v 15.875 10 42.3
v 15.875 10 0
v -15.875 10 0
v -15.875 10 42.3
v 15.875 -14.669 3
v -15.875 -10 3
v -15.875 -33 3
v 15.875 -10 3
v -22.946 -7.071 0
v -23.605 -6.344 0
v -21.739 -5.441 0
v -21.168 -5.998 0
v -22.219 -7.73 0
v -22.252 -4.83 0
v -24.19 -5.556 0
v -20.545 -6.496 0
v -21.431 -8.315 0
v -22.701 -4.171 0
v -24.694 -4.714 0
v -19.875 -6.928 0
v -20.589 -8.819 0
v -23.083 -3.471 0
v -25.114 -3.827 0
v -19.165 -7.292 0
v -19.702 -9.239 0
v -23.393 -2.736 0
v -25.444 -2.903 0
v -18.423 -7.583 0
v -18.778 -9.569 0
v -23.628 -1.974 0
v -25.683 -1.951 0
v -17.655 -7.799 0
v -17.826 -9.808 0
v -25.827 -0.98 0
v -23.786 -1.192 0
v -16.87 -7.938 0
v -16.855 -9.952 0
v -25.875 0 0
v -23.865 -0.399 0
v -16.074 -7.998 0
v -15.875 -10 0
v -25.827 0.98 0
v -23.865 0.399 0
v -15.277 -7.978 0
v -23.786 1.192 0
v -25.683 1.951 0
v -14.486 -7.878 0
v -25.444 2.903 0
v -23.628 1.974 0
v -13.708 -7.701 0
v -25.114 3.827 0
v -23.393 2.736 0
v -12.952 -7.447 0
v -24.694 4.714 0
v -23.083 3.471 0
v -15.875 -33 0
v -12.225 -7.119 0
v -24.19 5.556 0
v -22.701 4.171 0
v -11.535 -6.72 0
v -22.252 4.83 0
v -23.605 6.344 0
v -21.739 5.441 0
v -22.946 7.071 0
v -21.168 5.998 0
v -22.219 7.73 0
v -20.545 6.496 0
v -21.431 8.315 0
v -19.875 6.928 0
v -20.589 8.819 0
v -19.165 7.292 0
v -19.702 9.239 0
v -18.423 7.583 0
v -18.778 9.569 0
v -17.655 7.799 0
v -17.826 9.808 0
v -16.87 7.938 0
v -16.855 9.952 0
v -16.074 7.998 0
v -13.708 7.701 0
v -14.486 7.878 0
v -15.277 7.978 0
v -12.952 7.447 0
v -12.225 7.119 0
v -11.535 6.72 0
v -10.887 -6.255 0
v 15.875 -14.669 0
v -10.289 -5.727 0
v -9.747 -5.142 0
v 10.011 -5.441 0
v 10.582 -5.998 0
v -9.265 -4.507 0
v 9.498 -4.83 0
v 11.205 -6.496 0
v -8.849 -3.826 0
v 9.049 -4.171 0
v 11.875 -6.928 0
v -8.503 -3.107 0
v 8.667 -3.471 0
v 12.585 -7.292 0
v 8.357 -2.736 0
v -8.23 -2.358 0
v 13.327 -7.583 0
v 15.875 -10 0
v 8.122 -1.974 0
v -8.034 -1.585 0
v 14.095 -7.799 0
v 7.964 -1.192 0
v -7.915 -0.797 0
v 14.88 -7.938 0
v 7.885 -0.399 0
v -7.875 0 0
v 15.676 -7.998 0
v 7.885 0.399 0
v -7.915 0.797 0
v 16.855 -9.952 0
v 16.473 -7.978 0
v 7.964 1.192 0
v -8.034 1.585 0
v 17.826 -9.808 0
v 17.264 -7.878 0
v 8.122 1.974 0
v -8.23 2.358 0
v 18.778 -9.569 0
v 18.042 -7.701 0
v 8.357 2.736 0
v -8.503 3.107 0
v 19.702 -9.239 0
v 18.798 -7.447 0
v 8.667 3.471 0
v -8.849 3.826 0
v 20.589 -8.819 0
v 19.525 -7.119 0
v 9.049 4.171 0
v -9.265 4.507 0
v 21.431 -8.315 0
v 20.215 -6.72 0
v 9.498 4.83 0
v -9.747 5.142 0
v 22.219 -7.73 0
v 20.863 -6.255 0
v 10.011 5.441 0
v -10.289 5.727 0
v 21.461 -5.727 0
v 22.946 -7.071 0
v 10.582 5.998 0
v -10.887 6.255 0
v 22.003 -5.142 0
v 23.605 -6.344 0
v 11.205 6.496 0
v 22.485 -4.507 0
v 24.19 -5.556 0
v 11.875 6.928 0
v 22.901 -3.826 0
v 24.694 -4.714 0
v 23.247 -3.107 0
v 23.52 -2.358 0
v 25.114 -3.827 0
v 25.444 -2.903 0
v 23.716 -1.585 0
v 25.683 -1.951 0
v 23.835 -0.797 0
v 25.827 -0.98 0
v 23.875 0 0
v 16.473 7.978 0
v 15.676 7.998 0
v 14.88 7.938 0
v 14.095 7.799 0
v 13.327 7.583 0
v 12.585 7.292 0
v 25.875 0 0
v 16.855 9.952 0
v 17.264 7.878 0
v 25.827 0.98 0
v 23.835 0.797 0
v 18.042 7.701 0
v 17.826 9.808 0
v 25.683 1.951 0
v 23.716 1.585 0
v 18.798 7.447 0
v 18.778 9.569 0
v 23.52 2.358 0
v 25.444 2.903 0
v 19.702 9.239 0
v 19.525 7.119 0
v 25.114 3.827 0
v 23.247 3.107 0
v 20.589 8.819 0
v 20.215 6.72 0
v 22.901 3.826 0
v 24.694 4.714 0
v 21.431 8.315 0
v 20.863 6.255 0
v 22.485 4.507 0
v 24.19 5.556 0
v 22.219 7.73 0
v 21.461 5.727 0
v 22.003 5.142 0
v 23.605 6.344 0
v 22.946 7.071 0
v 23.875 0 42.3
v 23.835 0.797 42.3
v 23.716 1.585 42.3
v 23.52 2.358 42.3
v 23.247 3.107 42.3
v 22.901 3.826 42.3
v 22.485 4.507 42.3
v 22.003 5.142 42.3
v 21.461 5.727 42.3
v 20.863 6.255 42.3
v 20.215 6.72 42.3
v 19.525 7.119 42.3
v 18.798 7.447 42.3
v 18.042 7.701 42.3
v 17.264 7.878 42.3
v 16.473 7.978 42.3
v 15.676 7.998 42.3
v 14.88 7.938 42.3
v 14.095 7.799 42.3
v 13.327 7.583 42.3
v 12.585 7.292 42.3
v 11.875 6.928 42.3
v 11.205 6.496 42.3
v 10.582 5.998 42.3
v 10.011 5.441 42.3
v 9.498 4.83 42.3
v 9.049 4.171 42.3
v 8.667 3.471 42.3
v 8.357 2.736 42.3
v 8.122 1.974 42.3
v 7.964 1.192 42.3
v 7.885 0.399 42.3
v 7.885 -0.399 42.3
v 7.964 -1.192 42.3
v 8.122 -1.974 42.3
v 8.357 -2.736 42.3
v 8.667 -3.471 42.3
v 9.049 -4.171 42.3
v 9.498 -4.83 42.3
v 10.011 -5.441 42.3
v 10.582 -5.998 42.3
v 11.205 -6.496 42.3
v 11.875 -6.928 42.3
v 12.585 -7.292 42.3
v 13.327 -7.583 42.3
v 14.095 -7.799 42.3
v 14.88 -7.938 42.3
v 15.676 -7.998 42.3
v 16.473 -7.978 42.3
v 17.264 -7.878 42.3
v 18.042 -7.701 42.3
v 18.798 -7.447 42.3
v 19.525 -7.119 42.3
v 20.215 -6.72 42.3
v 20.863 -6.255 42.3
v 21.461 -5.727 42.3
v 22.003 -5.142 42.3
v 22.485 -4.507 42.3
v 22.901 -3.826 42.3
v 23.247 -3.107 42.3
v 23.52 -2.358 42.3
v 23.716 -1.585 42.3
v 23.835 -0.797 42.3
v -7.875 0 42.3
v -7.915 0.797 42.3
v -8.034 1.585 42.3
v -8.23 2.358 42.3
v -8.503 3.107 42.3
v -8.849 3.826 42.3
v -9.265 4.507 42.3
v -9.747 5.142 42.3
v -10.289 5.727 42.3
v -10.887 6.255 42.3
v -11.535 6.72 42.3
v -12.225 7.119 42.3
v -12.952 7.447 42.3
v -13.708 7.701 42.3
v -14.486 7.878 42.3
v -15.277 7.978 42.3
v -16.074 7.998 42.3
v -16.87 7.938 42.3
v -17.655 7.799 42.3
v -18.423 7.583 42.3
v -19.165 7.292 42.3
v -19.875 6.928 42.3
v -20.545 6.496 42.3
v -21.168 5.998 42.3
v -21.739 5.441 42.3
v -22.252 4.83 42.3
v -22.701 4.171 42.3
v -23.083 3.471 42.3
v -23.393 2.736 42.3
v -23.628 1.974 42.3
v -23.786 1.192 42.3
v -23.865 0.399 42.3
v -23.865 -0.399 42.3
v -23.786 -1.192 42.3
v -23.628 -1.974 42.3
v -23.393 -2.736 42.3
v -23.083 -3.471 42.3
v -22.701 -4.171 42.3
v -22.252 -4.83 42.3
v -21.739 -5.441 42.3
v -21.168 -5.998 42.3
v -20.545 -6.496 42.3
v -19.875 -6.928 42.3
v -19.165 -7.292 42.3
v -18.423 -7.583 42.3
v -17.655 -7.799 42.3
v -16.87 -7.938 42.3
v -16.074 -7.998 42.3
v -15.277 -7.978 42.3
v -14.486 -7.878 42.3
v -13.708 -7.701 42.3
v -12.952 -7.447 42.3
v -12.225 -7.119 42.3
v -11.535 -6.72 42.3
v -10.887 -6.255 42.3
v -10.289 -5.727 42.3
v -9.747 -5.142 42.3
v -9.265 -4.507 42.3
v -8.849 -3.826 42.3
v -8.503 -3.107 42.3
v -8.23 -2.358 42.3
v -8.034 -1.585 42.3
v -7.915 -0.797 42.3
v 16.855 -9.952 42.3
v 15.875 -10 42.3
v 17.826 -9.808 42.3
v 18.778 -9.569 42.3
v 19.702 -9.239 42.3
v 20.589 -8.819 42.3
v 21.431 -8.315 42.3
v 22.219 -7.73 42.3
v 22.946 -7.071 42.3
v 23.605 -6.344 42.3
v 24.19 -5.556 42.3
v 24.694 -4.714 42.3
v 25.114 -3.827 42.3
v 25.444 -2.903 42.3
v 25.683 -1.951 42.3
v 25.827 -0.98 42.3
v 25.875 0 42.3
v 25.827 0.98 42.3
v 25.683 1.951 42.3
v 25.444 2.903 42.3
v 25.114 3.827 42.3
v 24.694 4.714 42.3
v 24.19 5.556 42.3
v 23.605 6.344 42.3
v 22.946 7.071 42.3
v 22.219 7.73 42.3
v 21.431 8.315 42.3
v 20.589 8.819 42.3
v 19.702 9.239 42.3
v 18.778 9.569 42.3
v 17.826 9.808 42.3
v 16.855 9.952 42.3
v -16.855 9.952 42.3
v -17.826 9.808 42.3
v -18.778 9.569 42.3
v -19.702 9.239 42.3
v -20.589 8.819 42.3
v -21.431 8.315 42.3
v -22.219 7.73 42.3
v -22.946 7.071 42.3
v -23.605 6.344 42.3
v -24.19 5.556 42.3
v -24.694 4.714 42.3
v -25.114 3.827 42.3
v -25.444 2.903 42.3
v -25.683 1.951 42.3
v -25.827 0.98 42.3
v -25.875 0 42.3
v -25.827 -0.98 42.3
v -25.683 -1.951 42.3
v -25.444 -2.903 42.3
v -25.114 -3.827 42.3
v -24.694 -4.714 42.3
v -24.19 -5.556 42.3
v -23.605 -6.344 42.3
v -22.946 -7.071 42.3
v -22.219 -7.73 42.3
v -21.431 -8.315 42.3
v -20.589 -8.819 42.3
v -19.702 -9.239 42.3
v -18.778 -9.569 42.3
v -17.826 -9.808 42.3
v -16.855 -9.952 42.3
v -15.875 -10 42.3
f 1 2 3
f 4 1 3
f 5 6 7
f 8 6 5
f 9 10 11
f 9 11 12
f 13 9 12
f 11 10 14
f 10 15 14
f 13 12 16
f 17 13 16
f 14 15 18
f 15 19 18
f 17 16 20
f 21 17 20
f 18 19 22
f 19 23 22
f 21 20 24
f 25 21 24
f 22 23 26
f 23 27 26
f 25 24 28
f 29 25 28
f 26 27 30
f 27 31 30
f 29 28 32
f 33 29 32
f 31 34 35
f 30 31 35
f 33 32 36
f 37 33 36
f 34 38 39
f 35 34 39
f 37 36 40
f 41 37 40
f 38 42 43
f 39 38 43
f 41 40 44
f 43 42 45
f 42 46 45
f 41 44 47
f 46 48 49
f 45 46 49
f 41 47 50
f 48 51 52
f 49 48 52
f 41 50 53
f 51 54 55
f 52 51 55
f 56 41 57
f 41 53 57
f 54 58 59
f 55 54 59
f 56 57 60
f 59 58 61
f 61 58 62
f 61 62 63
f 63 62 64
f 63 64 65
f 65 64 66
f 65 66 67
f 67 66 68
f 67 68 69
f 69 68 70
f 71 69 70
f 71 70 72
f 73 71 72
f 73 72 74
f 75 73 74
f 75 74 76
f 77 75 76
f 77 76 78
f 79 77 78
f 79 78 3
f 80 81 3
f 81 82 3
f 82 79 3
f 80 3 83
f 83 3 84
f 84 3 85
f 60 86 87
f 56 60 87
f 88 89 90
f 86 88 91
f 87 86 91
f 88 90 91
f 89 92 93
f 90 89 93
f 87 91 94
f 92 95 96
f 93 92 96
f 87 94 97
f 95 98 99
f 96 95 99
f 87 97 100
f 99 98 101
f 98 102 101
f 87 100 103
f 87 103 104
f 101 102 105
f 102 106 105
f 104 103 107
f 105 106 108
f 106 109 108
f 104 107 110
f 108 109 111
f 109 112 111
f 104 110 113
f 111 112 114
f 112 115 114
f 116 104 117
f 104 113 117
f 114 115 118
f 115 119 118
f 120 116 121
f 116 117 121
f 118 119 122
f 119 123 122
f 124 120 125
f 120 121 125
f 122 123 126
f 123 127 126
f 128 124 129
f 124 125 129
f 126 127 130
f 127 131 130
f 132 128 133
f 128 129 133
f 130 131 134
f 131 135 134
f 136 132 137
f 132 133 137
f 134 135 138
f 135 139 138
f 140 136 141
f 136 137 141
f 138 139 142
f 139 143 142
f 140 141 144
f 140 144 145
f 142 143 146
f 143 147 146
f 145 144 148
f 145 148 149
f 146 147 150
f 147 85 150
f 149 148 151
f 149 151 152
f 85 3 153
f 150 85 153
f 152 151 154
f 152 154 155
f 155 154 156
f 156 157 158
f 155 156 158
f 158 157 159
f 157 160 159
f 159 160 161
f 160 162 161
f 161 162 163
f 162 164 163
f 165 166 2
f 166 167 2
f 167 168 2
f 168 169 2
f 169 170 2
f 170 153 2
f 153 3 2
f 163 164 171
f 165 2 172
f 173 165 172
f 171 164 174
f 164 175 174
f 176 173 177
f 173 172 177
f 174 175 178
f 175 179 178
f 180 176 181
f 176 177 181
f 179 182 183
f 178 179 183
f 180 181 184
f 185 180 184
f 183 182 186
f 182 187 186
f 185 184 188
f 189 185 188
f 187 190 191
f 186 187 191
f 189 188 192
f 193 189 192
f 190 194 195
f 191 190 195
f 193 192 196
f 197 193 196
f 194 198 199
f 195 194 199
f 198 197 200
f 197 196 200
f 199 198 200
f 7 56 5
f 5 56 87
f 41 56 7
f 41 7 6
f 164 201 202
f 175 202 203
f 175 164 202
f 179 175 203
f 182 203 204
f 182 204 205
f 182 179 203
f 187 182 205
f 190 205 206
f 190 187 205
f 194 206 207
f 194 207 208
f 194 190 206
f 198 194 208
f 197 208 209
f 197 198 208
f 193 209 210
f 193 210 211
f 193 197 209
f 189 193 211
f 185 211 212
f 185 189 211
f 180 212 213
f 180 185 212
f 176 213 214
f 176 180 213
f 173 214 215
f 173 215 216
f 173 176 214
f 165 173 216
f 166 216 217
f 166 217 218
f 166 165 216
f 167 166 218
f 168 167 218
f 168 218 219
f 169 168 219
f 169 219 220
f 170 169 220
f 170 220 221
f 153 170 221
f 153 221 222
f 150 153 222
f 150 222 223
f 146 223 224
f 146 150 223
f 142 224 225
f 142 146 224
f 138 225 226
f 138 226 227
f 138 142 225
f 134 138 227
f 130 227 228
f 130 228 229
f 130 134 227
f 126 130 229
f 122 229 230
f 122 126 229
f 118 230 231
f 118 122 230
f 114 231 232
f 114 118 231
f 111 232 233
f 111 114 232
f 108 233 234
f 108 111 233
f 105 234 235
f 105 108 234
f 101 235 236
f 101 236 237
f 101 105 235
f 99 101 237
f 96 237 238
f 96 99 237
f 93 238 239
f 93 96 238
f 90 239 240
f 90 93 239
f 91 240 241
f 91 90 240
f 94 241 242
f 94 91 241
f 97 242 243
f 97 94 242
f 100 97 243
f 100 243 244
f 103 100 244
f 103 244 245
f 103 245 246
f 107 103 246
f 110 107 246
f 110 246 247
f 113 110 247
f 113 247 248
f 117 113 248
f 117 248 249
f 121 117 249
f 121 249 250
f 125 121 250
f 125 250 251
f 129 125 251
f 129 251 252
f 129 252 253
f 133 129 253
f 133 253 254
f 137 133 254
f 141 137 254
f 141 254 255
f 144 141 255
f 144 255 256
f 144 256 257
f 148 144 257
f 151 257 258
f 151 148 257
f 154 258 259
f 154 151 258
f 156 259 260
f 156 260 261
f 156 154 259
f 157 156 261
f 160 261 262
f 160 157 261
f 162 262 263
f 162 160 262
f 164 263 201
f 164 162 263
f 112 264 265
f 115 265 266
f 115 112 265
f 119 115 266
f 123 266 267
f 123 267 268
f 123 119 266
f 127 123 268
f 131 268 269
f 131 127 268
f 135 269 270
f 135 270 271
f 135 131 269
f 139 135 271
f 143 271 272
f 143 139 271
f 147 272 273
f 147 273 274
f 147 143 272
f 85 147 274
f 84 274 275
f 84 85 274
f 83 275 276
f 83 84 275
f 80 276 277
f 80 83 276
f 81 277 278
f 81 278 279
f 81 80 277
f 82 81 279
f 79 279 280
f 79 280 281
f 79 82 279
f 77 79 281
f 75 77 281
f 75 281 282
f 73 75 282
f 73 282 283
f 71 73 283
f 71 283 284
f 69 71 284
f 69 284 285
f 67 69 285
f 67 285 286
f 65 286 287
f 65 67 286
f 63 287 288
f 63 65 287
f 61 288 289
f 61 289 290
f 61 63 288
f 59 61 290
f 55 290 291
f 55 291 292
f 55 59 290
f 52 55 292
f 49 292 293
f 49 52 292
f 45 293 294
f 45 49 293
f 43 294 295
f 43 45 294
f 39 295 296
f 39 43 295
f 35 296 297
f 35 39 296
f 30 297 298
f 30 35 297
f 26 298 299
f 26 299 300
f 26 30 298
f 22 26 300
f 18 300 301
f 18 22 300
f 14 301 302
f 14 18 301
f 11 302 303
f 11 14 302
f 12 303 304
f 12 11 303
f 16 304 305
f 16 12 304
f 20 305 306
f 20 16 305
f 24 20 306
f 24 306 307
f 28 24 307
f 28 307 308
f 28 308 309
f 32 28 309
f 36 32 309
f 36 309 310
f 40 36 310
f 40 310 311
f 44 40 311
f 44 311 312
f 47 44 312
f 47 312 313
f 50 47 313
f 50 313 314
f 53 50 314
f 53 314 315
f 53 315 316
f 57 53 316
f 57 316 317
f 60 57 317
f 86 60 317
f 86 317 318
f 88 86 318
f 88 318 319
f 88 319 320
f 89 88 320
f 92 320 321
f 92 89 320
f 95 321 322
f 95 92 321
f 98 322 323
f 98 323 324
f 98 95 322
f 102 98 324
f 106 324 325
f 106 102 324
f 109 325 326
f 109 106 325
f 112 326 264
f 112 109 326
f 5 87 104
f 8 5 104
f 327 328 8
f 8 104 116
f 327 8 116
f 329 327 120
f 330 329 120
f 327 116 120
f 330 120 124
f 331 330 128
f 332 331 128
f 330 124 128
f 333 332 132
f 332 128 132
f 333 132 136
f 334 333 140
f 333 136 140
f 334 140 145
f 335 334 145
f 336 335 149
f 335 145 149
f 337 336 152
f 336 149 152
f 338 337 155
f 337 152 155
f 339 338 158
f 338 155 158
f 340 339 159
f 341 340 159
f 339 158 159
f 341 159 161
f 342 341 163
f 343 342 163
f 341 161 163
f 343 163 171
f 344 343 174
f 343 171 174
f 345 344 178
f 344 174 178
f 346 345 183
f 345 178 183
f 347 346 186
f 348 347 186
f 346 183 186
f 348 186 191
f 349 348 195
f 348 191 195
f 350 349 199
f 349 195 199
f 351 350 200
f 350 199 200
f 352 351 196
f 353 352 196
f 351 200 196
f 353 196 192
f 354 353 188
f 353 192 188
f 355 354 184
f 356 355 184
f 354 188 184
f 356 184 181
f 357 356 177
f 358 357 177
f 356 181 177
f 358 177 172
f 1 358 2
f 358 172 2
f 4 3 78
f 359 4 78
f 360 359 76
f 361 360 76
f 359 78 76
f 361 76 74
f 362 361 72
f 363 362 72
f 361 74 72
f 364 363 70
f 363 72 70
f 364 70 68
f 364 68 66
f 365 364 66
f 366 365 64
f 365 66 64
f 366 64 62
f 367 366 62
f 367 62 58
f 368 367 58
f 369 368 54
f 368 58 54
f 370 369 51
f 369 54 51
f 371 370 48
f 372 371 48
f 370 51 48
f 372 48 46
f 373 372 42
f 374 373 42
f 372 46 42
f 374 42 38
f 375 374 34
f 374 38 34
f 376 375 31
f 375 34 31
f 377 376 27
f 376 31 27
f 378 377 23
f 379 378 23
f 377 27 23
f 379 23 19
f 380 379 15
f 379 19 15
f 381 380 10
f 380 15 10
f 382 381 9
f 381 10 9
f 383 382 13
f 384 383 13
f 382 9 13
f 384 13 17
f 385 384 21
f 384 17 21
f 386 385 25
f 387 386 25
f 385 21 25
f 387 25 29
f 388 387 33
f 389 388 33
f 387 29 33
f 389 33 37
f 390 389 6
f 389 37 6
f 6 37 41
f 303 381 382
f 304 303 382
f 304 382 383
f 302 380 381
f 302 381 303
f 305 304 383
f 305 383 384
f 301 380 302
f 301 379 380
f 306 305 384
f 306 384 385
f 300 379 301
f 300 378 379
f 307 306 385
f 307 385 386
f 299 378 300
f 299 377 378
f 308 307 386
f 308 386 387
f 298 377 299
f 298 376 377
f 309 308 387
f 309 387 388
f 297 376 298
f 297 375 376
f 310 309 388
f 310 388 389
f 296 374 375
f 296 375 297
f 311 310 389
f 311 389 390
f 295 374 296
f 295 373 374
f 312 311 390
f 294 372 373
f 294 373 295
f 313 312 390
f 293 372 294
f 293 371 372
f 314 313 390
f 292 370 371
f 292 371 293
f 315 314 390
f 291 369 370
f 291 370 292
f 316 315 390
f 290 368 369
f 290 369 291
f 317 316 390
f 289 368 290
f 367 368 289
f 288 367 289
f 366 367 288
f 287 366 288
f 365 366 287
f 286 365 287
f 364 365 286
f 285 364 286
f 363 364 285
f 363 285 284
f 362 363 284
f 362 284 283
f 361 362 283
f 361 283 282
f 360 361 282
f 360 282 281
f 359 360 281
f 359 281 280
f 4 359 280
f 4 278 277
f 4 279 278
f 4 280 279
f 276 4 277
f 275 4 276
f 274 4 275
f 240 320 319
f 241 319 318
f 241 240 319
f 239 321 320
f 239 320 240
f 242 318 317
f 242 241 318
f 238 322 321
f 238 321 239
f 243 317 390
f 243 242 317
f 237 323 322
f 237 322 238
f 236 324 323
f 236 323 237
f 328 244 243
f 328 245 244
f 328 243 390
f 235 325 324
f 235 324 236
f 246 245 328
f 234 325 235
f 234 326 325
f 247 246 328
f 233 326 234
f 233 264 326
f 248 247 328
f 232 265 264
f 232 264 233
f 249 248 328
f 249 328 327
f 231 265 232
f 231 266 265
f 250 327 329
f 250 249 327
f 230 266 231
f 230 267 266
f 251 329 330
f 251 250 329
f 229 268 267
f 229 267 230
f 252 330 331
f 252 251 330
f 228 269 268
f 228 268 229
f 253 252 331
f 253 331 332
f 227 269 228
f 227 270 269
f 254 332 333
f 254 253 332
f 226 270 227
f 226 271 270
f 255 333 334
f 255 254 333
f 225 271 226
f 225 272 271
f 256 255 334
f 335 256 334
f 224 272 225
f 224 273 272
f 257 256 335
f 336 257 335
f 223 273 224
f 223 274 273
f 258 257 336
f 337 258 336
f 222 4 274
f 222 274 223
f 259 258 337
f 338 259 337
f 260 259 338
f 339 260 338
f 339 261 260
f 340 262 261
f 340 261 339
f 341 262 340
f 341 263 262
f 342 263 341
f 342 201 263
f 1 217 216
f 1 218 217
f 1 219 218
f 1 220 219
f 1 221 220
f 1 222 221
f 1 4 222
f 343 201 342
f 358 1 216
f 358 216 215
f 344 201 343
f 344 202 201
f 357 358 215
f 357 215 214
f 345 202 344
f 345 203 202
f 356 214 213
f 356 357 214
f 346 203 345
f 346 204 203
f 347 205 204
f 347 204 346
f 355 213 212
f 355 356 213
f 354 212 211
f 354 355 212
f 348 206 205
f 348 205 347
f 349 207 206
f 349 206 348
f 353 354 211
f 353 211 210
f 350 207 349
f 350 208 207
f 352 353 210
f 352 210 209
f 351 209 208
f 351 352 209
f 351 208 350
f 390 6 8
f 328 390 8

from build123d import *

# Parameters (mm, degrees)
F0_R     = 8
F1_DEPTH = 42.3
F2_W     = 31.75
F2_H     = 23
F3_DEPTH = 3
F5_DEPTH = 25


with BuildPart() as f1:
    # F0 (on Top) → F1 (new body)
    with BuildSketch(Plane.XY):
        with BuildLine():
            Line((-15.875, -10), (15.875, -10))
            ThreePointArc((15.875, -10), (25.875, 0), (15.875, 10))
            Line((15.875, 10), (-15.875, 10))
            ThreePointArc((-15.875, 10), (-25.875, 0), (-15.875, -10))
        make_face()
        with Locations((-15.875, 0)):
            Circle(F0_R, mode=Mode.SUBTRACT)
        with Locations((15.875, 0)):
            Circle(F0_R, mode=Mode.SUBTRACT)
    extrude(amount=F1_DEPTH)

    # F2 (on Top) → F3 (join)
    with BuildSketch(Plane.XY):
        with Locations((0, -21.5)):
            Rectangle(F2_W, F2_H)
    extrude(amount=F3_DEPTH)

    # F4 (on face) → F5 (cut)
    with BuildSketch(Plane(origin=(0, 0, 0), x_dir=(1, 0, 0), z_dir=(0, 0, -1))):
        Polygon((15.875, 33), (-15.875, 33), (15.875, 14.669129), align=None)
    extrude(amount=-F5_DEPTH, mode=Mode.SUBTRACT)


solid = f1.part
